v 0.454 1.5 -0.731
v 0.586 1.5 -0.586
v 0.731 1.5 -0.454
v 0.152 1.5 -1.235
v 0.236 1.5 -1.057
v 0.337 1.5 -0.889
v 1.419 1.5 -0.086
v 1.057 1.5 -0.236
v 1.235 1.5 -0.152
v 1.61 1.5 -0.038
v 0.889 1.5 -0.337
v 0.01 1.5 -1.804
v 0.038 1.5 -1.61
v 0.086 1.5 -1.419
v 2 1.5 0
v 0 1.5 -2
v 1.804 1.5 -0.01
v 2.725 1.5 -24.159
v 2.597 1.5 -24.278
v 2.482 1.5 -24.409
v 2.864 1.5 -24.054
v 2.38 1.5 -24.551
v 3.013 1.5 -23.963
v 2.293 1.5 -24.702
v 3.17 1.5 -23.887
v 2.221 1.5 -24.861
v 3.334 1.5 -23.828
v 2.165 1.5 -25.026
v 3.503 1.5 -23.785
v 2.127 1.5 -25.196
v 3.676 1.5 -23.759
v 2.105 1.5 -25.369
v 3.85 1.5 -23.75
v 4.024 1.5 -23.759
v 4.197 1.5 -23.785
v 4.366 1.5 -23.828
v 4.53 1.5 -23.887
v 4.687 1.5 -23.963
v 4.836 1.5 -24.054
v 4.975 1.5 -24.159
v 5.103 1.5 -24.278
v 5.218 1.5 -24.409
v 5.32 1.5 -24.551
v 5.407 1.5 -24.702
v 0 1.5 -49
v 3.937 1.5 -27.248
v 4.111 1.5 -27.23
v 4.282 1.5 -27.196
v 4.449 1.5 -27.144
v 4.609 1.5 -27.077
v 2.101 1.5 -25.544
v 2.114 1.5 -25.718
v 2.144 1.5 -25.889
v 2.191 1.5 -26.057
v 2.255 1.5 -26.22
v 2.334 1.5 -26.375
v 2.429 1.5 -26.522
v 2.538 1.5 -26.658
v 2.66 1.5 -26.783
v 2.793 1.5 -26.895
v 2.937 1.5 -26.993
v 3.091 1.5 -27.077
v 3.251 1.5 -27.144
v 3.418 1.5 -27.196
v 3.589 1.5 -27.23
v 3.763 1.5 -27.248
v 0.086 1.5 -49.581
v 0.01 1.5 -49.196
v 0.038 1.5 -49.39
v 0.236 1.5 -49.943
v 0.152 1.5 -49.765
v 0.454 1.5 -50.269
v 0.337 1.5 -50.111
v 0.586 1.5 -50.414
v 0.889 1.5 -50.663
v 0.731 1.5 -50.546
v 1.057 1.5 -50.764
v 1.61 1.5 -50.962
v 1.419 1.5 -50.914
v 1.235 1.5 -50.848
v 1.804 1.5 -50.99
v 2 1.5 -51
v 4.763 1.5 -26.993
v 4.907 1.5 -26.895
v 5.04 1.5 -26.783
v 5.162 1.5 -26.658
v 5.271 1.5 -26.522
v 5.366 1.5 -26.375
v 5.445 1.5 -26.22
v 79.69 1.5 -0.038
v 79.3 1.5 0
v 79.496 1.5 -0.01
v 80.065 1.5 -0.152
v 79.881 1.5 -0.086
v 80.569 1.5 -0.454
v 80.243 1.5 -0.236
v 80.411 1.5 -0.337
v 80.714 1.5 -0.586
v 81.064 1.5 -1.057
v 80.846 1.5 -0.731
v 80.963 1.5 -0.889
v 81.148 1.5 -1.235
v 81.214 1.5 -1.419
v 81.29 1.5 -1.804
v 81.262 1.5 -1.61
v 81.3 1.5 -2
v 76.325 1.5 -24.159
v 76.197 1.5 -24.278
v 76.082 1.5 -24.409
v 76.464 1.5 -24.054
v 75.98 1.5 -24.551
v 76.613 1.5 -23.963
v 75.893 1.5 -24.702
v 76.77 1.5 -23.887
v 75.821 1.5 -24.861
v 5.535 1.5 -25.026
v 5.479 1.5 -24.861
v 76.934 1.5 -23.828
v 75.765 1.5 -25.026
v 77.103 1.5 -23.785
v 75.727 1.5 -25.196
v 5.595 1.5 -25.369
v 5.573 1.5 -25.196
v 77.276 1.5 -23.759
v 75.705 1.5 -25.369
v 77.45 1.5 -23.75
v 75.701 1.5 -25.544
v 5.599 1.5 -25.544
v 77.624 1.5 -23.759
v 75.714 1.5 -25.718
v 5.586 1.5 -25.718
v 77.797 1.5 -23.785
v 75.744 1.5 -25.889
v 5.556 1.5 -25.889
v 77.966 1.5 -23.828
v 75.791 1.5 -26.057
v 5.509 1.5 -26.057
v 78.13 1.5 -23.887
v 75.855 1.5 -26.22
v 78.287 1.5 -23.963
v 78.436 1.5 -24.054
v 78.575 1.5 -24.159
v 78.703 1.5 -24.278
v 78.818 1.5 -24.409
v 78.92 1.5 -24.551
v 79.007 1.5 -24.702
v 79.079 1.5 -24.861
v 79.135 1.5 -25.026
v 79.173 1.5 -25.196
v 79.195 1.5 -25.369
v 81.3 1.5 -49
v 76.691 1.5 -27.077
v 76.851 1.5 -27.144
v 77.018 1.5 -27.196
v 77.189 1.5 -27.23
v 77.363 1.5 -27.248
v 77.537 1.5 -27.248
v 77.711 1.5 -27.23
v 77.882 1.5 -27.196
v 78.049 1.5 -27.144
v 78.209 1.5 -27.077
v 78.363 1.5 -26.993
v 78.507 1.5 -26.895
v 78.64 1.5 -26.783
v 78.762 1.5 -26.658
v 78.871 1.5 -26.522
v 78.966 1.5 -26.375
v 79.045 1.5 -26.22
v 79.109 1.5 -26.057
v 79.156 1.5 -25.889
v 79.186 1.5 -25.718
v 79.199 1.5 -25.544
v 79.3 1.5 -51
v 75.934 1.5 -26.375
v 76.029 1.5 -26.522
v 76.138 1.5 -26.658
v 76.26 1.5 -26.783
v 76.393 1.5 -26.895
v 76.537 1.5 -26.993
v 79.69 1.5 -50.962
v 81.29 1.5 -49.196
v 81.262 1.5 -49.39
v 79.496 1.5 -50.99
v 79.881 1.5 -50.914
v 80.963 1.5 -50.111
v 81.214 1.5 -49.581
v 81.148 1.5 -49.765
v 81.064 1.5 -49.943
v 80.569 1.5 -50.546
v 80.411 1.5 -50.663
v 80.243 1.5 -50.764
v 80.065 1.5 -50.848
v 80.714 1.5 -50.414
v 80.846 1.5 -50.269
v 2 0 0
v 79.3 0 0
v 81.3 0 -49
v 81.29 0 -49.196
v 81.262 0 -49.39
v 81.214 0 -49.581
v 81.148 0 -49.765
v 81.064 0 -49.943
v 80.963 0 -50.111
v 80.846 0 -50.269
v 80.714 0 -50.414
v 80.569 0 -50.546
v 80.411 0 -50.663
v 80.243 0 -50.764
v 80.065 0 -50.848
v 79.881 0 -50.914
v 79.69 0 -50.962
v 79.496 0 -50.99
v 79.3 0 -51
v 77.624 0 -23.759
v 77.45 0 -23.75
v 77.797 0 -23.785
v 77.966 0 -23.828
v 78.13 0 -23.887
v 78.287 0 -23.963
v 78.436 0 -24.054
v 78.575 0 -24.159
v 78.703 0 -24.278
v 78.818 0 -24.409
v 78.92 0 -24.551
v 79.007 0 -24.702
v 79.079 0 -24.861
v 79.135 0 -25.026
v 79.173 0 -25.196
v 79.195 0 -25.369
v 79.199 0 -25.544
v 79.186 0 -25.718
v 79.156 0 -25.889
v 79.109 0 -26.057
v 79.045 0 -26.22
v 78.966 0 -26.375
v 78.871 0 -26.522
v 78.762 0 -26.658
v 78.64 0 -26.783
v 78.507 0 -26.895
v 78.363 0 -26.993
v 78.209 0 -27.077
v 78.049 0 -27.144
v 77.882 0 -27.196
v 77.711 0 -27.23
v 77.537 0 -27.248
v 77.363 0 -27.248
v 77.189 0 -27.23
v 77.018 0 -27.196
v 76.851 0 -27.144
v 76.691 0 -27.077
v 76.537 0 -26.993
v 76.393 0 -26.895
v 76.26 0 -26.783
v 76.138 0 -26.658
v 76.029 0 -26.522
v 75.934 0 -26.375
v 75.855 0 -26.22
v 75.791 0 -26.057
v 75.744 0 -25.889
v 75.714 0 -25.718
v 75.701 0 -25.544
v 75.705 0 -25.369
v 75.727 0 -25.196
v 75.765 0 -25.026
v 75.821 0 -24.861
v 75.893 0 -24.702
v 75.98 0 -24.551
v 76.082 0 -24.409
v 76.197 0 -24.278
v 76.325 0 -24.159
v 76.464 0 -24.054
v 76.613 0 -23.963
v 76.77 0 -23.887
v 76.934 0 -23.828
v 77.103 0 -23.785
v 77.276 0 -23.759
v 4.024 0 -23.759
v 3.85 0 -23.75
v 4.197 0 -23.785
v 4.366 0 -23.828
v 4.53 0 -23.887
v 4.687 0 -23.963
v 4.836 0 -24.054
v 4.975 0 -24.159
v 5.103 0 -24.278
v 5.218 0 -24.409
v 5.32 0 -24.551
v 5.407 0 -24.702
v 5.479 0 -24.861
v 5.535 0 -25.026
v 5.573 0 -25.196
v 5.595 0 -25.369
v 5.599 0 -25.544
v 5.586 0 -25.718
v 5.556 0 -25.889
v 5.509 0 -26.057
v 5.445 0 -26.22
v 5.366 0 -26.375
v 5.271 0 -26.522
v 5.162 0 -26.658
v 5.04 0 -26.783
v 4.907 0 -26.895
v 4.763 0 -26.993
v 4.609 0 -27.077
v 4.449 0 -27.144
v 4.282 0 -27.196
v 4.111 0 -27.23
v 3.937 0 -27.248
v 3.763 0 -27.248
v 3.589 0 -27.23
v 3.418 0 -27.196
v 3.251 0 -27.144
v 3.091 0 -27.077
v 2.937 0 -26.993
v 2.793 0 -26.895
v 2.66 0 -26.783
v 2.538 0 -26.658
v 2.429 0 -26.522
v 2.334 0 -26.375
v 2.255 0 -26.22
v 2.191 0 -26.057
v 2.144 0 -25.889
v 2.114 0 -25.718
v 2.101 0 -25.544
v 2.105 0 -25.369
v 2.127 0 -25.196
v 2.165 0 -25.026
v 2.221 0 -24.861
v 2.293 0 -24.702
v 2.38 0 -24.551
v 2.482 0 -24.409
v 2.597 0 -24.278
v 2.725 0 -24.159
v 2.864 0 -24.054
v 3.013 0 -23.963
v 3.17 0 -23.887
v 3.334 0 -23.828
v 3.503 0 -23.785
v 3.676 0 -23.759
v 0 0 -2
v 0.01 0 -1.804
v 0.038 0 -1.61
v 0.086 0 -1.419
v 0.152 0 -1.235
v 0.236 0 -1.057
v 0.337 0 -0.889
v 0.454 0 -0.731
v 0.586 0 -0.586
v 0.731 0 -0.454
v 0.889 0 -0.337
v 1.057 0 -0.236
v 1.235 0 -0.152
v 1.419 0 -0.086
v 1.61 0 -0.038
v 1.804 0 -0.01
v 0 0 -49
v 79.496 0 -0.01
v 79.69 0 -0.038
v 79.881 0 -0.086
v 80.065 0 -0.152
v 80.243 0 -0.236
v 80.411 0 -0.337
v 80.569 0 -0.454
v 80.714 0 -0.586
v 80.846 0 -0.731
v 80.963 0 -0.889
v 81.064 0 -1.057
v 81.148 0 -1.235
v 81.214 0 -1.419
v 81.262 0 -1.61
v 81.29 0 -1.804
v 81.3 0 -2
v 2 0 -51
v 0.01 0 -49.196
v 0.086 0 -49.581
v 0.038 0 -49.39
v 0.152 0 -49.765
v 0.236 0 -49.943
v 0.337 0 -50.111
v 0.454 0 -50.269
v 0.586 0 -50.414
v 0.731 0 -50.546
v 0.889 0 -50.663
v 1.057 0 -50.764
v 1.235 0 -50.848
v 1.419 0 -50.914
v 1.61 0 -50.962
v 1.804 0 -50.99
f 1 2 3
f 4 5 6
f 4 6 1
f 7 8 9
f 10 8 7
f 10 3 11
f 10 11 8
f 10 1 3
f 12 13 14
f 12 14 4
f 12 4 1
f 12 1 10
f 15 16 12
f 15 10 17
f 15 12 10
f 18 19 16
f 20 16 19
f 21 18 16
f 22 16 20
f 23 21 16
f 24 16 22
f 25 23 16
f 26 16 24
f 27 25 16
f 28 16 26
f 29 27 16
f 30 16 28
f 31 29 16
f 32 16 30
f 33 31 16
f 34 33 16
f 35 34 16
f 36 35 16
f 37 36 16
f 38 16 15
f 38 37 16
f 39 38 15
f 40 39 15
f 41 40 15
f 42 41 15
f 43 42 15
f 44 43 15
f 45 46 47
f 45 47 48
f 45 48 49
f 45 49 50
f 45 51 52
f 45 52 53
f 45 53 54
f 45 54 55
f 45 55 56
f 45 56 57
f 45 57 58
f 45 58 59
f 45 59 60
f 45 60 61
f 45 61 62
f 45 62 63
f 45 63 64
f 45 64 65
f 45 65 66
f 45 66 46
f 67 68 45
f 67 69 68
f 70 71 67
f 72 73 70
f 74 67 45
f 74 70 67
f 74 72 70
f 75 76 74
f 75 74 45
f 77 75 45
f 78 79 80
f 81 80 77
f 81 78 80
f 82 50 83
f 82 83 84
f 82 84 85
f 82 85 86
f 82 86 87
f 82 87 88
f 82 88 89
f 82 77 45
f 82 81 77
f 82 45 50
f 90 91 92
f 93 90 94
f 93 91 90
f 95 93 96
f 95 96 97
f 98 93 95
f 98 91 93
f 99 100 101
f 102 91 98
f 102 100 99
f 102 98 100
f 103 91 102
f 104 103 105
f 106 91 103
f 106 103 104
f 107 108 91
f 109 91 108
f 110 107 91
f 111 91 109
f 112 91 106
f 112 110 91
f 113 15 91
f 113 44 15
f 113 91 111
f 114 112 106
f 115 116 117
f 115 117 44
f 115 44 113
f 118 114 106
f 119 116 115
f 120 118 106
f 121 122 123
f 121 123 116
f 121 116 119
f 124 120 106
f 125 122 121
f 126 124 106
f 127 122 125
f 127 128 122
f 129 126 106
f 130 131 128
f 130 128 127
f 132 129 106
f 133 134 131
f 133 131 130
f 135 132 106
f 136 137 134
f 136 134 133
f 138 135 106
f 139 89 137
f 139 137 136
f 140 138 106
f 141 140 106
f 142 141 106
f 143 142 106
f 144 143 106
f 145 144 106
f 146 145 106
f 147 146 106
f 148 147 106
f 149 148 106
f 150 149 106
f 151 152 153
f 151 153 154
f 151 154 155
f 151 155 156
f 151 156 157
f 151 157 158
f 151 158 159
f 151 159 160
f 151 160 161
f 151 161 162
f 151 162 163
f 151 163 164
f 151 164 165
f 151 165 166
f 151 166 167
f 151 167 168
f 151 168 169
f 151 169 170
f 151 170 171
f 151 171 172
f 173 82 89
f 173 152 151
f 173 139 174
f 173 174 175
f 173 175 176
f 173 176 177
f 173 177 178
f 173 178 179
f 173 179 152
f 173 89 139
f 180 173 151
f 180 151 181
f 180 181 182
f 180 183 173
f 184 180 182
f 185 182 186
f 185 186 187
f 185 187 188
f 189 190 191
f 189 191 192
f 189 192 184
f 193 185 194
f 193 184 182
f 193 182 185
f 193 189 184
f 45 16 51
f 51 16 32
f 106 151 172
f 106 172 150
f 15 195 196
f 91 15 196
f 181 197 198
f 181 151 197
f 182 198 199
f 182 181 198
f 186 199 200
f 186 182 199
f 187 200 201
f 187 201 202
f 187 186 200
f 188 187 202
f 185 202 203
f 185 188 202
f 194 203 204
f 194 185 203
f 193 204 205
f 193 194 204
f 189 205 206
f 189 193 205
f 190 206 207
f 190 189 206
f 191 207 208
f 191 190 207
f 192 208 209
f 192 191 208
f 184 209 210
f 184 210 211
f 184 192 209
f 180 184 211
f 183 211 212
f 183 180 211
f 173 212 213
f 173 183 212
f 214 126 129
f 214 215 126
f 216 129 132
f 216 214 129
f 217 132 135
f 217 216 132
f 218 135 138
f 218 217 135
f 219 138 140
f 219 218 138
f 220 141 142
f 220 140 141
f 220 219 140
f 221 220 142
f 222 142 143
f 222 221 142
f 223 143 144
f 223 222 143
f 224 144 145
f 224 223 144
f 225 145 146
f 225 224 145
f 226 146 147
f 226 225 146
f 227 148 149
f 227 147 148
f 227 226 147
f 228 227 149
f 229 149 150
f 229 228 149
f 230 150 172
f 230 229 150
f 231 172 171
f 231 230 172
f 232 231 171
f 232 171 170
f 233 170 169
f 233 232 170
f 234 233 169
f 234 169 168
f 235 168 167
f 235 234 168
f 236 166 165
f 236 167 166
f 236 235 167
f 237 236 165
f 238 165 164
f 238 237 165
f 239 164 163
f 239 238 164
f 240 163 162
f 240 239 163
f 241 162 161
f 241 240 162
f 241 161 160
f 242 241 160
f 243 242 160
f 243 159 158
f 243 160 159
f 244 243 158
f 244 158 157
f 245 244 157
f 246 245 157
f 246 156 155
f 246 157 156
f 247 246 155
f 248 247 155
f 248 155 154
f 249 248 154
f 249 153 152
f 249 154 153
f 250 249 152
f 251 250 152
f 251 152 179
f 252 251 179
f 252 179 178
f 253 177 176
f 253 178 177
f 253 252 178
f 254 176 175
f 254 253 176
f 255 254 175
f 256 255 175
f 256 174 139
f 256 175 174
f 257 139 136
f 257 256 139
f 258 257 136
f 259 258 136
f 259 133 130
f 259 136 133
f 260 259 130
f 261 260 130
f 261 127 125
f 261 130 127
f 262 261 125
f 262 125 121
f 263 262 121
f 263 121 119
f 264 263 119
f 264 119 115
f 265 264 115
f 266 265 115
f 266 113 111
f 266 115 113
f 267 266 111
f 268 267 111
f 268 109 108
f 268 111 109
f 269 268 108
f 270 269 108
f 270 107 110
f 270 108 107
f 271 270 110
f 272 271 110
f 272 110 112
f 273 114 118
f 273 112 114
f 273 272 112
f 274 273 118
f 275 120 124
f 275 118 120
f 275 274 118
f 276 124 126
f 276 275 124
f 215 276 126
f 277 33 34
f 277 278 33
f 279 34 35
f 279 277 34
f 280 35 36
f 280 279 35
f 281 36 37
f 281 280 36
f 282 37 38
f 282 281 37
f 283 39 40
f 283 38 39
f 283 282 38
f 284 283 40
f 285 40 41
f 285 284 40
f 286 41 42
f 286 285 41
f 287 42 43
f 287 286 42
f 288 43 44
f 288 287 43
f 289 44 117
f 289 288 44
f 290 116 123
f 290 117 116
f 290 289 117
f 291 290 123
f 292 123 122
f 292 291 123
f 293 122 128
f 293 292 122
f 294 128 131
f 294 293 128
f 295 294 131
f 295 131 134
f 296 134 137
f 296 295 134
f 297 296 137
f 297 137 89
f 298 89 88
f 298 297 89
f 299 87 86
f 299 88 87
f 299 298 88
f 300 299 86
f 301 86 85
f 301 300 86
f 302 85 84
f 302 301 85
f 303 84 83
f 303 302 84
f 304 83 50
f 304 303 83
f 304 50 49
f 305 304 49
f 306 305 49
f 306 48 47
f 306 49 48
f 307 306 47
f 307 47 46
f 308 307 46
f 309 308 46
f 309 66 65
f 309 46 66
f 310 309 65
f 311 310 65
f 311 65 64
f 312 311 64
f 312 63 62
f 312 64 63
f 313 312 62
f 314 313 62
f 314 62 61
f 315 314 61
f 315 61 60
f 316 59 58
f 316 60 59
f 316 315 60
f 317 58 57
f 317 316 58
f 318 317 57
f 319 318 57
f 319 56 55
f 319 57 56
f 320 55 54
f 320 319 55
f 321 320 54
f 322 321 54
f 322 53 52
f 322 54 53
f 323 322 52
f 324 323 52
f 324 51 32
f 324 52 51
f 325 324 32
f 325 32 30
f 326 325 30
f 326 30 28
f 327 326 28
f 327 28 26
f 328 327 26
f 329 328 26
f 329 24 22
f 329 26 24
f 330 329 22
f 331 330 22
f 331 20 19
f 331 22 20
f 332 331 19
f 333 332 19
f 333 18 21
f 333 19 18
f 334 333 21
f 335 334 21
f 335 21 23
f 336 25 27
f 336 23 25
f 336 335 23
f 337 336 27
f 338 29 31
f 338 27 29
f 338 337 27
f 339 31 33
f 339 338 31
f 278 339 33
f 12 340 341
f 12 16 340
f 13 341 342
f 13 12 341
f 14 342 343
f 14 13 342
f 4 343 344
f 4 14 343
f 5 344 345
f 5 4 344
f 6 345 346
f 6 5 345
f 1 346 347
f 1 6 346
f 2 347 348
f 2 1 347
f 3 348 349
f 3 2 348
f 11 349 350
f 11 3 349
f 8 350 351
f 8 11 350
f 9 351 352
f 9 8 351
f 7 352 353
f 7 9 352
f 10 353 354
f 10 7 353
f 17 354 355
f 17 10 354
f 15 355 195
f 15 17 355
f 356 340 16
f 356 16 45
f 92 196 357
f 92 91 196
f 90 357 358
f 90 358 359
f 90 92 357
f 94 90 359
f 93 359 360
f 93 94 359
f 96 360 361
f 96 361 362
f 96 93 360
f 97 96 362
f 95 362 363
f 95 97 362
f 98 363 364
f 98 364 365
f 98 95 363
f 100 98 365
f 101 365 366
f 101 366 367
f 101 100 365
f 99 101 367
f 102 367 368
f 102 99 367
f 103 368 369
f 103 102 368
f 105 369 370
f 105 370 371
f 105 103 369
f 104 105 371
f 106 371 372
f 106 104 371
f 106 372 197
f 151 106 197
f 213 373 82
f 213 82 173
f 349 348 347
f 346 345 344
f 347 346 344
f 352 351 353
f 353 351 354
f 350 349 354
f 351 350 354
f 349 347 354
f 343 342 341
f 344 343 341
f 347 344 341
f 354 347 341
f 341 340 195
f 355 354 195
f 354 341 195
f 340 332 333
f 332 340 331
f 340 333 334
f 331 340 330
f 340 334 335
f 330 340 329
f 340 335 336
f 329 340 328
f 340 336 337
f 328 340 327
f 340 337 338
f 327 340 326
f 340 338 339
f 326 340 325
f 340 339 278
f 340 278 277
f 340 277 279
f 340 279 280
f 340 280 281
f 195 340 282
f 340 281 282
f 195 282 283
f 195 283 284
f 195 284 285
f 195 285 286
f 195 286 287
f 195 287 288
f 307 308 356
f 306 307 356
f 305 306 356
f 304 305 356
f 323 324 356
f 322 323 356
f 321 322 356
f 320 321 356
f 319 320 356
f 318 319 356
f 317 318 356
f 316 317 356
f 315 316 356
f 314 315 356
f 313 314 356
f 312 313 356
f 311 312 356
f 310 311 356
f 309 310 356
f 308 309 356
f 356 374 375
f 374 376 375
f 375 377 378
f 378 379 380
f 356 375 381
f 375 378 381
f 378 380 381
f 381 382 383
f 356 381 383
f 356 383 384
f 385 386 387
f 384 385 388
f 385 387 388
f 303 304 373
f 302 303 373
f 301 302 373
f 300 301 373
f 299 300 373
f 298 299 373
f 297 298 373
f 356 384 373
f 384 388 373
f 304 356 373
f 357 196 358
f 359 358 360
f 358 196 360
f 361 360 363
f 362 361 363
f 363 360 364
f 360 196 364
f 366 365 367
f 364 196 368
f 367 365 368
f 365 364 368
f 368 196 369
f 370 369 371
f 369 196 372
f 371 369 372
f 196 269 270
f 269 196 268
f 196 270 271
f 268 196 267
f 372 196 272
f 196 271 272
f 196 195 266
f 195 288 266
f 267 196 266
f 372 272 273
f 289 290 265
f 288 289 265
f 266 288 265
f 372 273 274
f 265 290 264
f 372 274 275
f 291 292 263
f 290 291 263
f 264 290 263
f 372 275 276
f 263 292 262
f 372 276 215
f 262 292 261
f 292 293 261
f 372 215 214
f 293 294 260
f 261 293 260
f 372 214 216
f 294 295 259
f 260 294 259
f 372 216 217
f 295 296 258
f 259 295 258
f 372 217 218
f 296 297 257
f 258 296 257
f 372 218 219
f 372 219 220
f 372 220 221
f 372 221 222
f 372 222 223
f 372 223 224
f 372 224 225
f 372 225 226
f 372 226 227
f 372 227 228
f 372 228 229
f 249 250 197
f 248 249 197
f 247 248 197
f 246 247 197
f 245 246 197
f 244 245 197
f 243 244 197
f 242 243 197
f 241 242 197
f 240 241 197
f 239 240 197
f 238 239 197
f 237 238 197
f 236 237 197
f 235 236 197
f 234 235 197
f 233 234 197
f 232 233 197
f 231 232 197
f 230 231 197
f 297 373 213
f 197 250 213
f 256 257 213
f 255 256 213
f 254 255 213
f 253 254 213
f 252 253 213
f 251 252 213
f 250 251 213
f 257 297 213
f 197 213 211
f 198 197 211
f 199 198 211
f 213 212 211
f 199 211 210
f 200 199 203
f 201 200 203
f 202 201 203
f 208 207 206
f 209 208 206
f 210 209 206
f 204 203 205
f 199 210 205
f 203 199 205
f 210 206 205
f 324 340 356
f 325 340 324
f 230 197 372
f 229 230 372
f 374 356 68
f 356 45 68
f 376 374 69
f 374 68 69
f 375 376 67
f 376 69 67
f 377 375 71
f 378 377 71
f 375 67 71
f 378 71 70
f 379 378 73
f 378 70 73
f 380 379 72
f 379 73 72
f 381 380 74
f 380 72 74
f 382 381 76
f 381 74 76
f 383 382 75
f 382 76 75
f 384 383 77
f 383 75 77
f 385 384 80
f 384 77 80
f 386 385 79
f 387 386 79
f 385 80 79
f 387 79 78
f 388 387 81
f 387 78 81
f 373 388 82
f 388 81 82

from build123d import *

# Parameters (mm, degrees)
SKETCH1_W               = 81.3
SKETCH1_H               = 51
BOSS_EXTRUDE1_DEPTH     = 1.5
FILLET1_R               = 2
CUT_EXTRUDE1_DEPTH      = 96.984061177
CUT_EXTRUDE1_DEPTH_BACK = 96.984061177
SKETCH2_R               = 1.75


with BuildPart() as part:
    # Sketch1 → Boss-Extrude1 (new body)
    with BuildSketch(Plane(origin=(0, 0, 0), x_dir=(1, 0, 0), z_dir=(0, 1, 0))):
        with Locations((40.65, 25.5)):
            Rectangle(SKETCH1_W, SKETCH1_H)
    extrude(amount=BOSS_EXTRUDE1_DEPTH)

    # Fillet1
    fillet1_edges = [part.edges().sort_by_distance(p)[0] for p in [
        (0, 0.75, -51),
        (81.3, 0.75, -51),
        (81.3, 0.75, 0),
        (0, 0.75, 0),
    ]]
    fillet(fillet1_edges, radius=FILLET1_R)

    # Sketch2 → Cut-Extrude1 (cut, two sides: drawn at the far end of the back side and taken through both)
    with BuildSketch(Plane(origin=(0, 1.5, 0), x_dir=(1, 0, 0), z_dir=(0, 1, 0)).offset(-CUT_EXTRUDE1_DEPTH_BACK)):
        with Locations(Location((3.85, 25.5, 0), (0, 0, 270))):
            Circle(SKETCH2_R)
        with Locations(Location((77.45, 25.5, 0), (0, 0, 270))):
            Circle(SKETCH2_R)
    extrude(amount=CUT_EXTRUDE1_DEPTH + CUT_EXTRUDE1_DEPTH_BACK, mode=Mode.SUBTRACT)


solid = part.part
